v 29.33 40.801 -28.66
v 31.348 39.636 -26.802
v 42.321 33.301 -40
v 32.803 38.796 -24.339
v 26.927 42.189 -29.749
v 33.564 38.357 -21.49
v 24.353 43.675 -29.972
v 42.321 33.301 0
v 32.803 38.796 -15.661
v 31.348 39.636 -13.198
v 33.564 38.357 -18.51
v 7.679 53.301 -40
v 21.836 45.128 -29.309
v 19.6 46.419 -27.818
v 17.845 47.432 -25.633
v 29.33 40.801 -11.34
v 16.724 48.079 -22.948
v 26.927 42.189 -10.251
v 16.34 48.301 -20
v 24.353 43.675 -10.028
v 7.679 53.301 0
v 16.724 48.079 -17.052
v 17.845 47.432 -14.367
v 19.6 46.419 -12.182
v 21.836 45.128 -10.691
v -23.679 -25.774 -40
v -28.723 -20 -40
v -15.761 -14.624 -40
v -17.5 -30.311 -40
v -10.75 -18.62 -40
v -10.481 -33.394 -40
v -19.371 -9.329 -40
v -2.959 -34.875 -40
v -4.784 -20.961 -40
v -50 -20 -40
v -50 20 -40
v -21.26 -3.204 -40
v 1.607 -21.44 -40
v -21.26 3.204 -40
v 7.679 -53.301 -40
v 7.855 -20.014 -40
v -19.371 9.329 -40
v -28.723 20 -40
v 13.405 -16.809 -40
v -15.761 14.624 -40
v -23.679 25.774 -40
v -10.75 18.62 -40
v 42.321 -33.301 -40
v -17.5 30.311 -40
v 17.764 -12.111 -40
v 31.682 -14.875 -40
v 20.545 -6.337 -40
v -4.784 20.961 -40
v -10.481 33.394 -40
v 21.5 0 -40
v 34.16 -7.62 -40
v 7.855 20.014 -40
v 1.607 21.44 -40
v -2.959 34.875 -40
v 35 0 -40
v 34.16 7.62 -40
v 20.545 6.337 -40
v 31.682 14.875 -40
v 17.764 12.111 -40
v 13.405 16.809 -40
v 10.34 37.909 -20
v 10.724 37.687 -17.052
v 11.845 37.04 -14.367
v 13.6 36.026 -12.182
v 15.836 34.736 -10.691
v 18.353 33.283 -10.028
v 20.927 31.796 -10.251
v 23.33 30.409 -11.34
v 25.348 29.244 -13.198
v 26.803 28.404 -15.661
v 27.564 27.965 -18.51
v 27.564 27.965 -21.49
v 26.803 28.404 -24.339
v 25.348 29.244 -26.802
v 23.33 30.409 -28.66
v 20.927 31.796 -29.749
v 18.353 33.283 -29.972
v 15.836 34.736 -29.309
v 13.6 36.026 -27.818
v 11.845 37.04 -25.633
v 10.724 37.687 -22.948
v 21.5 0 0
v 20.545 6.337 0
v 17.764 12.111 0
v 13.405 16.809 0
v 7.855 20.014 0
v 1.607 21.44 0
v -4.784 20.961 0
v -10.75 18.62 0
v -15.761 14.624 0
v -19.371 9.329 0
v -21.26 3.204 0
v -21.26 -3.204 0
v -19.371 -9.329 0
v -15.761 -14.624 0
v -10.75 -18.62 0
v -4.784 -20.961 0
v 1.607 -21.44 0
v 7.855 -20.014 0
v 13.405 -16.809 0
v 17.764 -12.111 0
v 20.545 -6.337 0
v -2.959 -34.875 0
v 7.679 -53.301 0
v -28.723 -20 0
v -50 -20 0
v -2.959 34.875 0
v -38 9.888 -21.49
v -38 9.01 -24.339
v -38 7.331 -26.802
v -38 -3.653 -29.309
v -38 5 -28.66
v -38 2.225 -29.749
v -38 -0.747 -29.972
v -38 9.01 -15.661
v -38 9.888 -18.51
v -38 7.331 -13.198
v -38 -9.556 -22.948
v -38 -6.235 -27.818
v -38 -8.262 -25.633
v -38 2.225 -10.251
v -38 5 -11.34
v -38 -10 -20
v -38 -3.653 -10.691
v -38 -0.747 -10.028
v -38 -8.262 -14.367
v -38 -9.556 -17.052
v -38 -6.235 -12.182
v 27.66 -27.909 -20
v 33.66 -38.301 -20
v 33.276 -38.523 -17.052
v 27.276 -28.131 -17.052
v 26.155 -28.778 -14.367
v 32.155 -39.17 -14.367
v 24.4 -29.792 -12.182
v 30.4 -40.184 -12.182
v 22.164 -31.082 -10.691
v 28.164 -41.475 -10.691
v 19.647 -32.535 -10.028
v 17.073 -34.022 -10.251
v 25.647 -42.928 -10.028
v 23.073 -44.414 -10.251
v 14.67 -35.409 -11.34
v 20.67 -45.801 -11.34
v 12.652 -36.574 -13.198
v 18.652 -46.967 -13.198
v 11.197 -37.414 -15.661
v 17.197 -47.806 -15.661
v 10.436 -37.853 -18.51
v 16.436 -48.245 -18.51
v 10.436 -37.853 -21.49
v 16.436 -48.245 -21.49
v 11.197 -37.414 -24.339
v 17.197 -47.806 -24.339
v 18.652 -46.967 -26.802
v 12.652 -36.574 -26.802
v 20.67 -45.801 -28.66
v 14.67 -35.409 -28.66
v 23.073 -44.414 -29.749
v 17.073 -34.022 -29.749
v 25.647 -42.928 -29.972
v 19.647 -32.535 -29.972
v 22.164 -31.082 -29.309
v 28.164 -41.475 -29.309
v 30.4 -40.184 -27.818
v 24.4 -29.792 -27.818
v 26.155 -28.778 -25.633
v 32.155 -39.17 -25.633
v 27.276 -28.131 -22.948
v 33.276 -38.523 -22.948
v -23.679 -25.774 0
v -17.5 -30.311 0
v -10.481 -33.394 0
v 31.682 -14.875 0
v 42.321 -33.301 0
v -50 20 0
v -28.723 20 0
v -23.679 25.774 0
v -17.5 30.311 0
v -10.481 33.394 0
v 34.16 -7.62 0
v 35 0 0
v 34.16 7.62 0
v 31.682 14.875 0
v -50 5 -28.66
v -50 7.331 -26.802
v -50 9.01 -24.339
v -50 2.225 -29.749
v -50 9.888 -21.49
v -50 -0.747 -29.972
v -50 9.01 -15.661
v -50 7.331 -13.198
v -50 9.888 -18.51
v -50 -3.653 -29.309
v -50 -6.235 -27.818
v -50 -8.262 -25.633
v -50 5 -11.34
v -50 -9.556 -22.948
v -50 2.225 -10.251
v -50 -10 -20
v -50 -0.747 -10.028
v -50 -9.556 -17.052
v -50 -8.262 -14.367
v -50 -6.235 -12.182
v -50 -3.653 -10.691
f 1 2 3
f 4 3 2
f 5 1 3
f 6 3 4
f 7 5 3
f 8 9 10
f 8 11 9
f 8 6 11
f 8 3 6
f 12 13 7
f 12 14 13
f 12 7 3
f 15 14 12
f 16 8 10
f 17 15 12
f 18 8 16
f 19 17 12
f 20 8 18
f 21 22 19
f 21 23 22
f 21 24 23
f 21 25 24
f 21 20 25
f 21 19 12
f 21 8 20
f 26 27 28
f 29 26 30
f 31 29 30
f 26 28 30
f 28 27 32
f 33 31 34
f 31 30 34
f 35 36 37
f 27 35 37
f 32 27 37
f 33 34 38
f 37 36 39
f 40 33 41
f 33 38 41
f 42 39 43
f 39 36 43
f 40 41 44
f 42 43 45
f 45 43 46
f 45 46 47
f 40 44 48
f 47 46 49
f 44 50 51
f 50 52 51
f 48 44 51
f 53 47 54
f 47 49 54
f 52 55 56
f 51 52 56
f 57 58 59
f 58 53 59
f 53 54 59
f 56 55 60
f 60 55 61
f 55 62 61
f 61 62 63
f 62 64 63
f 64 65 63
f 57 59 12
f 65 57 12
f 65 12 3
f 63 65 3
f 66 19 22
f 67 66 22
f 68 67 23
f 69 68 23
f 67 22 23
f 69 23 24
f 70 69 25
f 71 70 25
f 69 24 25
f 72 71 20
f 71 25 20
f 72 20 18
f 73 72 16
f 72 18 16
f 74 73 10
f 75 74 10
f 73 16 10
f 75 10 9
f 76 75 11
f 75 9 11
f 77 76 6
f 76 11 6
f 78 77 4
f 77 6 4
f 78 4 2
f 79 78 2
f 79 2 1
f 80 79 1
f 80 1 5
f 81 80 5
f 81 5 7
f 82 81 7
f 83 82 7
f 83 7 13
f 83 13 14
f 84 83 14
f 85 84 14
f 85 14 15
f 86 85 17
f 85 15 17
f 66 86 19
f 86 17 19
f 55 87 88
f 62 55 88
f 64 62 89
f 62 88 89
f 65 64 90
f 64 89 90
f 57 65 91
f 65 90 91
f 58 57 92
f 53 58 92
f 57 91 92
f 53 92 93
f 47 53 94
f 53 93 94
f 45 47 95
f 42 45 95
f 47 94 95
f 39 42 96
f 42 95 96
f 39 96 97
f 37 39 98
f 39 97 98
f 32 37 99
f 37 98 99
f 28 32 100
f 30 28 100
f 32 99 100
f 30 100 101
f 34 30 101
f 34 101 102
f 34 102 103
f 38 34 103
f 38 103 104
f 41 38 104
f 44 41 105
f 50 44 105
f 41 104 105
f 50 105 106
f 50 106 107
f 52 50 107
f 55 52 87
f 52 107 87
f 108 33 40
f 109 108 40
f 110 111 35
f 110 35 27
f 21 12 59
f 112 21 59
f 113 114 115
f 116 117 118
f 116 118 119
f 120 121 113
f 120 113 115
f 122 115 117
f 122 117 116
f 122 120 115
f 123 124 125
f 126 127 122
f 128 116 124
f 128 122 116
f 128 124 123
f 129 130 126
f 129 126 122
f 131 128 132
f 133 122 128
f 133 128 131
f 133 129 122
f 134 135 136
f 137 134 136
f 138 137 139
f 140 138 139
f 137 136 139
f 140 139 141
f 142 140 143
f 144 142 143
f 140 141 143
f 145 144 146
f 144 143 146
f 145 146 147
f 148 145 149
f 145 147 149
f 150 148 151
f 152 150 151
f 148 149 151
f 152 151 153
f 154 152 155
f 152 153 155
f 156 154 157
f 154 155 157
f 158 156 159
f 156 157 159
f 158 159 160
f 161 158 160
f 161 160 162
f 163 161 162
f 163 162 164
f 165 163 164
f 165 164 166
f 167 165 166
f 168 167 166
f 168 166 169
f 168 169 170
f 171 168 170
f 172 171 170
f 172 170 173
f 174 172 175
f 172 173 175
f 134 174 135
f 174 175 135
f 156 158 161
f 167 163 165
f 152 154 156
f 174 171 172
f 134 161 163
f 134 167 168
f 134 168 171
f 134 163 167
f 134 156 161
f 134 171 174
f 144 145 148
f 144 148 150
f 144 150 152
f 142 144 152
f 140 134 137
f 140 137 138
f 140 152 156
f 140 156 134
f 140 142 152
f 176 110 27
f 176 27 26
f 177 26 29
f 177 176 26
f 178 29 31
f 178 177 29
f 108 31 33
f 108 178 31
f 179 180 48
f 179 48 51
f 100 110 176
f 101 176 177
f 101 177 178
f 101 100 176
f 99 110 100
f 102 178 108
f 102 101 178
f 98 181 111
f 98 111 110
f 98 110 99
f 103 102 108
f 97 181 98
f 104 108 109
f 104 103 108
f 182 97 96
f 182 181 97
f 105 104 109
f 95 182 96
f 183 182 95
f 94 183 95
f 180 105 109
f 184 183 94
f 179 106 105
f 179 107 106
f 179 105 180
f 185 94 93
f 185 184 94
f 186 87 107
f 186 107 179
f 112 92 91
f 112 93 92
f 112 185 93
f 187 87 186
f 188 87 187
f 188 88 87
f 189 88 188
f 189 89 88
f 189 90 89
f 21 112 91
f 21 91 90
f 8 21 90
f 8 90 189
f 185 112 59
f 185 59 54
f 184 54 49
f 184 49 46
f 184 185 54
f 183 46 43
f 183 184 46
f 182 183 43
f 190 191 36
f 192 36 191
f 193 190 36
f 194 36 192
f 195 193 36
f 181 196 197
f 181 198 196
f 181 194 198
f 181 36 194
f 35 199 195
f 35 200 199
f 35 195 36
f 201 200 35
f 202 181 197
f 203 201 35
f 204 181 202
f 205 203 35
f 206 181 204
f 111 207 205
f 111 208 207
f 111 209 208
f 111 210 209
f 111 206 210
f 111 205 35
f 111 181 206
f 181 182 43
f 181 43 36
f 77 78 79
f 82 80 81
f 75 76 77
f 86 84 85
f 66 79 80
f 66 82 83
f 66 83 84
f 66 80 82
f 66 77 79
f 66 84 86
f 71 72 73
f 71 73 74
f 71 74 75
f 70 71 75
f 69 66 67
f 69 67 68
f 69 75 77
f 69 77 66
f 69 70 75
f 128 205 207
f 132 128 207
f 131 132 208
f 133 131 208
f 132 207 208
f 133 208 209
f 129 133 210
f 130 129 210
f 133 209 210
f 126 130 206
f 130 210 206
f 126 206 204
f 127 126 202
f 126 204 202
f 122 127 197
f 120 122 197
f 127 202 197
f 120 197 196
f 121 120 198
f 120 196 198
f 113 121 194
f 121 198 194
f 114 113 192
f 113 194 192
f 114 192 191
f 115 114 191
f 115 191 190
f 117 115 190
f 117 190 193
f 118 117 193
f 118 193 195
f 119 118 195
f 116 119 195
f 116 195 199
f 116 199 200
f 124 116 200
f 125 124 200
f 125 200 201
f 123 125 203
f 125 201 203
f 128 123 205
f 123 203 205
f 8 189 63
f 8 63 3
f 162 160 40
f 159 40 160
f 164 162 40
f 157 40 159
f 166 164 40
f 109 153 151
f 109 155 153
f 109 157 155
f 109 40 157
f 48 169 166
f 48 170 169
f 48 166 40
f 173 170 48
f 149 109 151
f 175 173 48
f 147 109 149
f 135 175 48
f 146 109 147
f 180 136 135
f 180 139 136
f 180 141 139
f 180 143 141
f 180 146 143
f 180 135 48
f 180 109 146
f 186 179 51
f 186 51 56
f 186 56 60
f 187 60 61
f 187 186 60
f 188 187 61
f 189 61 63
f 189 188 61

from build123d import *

# Parameters (mm, degrees)
F0_R     = 21.5
F1_DEPTH = 40
F2_R     = 10
F5_DEPTH = 12
F3_R     = 10
F6_DEPTH = 12
F4_R     = 10
F7_DEPTH = 12


# Not quite as in the source:
# - a feature names something its author has since deleted; it is built from what else it names


with BuildPart() as f1:
    # F0 (on Top) → F1 (new body)
    with BuildSketch(Plane.XY):
        with BuildLine():
            Line((7.6794919243, 53.3012701892), (-2.9591014593, 34.8746859277))
            ThreePointArc((-2.9591014593, 34.8746859277), (-17.5, 30.3108891325), (-28.7228132327, 20))
            Line((-28.7228132327, 20), (-50, 20))
            Line((-50, 20), (-50, -20))
            Line((-50, -20), (-28.7228132327, -20))
            ThreePointArc((-28.7228132327, -20), (-17.5, -30.3108891325), (-2.9591014593, -34.8746859277))
            Line((-2.9591014593, -34.8746859277), (7.6794919243, -53.3012701892))
            Line((7.6794919243, -53.3012701892), (42.3205080757, -33.3012701892))
            Line((42.3205080757, -33.3012701892), (31.681914692, -14.8746859277))
            ThreePointArc((31.681914692, -14.8746859277), (35, 0), (31.681914692, 14.8746859277))
            Line((31.681914692, 14.8746859277), (42.3205080757, 33.3012701892))
            Line((42.3205080757, 33.3012701892), (7.6794919243, 53.3012701892))
        make_face()
        Circle(F0_R, mode=Mode.SUBTRACT)
    extrude(amount=-F1_DEPTH)

    # F2 (on face) → F5 (cut)
    with BuildSketch(Plane(origin=(-50, 0, 0), x_dir=(0, -1, 0), z_dir=(-1, 0, 0))):
        with Locations((0, -20)):
            Circle(F2_R)
    extrude(amount=-F5_DEPTH, mode=Mode.SUBTRACT)

    # F3 (on face) → F6 (cut)
    with BuildSketch(Plane(origin=(25, -43.3012701892, 0), x_dir=(0.8660254038, 0.5, 0), z_dir=(0.5, -0.8660254038, 0))):
        with Locations((0, -20)):
            Circle(F3_R)
    extrude(amount=-F6_DEPTH, mode=Mode.SUBTRACT)

    # F4 (on face) → F7 (cut)
    with BuildSketch(Plane(origin=(25, 43.3012701892, 0), x_dir=(-0.8660254038, 0.5, 0), z_dir=(0.5, 0.8660254038, 0))):
        with Locations((0, -20)):
            Circle(F4_R)
    extrude(amount=-F7_DEPTH, mode=Mode.SUBTRACT)


solid = f1.part
